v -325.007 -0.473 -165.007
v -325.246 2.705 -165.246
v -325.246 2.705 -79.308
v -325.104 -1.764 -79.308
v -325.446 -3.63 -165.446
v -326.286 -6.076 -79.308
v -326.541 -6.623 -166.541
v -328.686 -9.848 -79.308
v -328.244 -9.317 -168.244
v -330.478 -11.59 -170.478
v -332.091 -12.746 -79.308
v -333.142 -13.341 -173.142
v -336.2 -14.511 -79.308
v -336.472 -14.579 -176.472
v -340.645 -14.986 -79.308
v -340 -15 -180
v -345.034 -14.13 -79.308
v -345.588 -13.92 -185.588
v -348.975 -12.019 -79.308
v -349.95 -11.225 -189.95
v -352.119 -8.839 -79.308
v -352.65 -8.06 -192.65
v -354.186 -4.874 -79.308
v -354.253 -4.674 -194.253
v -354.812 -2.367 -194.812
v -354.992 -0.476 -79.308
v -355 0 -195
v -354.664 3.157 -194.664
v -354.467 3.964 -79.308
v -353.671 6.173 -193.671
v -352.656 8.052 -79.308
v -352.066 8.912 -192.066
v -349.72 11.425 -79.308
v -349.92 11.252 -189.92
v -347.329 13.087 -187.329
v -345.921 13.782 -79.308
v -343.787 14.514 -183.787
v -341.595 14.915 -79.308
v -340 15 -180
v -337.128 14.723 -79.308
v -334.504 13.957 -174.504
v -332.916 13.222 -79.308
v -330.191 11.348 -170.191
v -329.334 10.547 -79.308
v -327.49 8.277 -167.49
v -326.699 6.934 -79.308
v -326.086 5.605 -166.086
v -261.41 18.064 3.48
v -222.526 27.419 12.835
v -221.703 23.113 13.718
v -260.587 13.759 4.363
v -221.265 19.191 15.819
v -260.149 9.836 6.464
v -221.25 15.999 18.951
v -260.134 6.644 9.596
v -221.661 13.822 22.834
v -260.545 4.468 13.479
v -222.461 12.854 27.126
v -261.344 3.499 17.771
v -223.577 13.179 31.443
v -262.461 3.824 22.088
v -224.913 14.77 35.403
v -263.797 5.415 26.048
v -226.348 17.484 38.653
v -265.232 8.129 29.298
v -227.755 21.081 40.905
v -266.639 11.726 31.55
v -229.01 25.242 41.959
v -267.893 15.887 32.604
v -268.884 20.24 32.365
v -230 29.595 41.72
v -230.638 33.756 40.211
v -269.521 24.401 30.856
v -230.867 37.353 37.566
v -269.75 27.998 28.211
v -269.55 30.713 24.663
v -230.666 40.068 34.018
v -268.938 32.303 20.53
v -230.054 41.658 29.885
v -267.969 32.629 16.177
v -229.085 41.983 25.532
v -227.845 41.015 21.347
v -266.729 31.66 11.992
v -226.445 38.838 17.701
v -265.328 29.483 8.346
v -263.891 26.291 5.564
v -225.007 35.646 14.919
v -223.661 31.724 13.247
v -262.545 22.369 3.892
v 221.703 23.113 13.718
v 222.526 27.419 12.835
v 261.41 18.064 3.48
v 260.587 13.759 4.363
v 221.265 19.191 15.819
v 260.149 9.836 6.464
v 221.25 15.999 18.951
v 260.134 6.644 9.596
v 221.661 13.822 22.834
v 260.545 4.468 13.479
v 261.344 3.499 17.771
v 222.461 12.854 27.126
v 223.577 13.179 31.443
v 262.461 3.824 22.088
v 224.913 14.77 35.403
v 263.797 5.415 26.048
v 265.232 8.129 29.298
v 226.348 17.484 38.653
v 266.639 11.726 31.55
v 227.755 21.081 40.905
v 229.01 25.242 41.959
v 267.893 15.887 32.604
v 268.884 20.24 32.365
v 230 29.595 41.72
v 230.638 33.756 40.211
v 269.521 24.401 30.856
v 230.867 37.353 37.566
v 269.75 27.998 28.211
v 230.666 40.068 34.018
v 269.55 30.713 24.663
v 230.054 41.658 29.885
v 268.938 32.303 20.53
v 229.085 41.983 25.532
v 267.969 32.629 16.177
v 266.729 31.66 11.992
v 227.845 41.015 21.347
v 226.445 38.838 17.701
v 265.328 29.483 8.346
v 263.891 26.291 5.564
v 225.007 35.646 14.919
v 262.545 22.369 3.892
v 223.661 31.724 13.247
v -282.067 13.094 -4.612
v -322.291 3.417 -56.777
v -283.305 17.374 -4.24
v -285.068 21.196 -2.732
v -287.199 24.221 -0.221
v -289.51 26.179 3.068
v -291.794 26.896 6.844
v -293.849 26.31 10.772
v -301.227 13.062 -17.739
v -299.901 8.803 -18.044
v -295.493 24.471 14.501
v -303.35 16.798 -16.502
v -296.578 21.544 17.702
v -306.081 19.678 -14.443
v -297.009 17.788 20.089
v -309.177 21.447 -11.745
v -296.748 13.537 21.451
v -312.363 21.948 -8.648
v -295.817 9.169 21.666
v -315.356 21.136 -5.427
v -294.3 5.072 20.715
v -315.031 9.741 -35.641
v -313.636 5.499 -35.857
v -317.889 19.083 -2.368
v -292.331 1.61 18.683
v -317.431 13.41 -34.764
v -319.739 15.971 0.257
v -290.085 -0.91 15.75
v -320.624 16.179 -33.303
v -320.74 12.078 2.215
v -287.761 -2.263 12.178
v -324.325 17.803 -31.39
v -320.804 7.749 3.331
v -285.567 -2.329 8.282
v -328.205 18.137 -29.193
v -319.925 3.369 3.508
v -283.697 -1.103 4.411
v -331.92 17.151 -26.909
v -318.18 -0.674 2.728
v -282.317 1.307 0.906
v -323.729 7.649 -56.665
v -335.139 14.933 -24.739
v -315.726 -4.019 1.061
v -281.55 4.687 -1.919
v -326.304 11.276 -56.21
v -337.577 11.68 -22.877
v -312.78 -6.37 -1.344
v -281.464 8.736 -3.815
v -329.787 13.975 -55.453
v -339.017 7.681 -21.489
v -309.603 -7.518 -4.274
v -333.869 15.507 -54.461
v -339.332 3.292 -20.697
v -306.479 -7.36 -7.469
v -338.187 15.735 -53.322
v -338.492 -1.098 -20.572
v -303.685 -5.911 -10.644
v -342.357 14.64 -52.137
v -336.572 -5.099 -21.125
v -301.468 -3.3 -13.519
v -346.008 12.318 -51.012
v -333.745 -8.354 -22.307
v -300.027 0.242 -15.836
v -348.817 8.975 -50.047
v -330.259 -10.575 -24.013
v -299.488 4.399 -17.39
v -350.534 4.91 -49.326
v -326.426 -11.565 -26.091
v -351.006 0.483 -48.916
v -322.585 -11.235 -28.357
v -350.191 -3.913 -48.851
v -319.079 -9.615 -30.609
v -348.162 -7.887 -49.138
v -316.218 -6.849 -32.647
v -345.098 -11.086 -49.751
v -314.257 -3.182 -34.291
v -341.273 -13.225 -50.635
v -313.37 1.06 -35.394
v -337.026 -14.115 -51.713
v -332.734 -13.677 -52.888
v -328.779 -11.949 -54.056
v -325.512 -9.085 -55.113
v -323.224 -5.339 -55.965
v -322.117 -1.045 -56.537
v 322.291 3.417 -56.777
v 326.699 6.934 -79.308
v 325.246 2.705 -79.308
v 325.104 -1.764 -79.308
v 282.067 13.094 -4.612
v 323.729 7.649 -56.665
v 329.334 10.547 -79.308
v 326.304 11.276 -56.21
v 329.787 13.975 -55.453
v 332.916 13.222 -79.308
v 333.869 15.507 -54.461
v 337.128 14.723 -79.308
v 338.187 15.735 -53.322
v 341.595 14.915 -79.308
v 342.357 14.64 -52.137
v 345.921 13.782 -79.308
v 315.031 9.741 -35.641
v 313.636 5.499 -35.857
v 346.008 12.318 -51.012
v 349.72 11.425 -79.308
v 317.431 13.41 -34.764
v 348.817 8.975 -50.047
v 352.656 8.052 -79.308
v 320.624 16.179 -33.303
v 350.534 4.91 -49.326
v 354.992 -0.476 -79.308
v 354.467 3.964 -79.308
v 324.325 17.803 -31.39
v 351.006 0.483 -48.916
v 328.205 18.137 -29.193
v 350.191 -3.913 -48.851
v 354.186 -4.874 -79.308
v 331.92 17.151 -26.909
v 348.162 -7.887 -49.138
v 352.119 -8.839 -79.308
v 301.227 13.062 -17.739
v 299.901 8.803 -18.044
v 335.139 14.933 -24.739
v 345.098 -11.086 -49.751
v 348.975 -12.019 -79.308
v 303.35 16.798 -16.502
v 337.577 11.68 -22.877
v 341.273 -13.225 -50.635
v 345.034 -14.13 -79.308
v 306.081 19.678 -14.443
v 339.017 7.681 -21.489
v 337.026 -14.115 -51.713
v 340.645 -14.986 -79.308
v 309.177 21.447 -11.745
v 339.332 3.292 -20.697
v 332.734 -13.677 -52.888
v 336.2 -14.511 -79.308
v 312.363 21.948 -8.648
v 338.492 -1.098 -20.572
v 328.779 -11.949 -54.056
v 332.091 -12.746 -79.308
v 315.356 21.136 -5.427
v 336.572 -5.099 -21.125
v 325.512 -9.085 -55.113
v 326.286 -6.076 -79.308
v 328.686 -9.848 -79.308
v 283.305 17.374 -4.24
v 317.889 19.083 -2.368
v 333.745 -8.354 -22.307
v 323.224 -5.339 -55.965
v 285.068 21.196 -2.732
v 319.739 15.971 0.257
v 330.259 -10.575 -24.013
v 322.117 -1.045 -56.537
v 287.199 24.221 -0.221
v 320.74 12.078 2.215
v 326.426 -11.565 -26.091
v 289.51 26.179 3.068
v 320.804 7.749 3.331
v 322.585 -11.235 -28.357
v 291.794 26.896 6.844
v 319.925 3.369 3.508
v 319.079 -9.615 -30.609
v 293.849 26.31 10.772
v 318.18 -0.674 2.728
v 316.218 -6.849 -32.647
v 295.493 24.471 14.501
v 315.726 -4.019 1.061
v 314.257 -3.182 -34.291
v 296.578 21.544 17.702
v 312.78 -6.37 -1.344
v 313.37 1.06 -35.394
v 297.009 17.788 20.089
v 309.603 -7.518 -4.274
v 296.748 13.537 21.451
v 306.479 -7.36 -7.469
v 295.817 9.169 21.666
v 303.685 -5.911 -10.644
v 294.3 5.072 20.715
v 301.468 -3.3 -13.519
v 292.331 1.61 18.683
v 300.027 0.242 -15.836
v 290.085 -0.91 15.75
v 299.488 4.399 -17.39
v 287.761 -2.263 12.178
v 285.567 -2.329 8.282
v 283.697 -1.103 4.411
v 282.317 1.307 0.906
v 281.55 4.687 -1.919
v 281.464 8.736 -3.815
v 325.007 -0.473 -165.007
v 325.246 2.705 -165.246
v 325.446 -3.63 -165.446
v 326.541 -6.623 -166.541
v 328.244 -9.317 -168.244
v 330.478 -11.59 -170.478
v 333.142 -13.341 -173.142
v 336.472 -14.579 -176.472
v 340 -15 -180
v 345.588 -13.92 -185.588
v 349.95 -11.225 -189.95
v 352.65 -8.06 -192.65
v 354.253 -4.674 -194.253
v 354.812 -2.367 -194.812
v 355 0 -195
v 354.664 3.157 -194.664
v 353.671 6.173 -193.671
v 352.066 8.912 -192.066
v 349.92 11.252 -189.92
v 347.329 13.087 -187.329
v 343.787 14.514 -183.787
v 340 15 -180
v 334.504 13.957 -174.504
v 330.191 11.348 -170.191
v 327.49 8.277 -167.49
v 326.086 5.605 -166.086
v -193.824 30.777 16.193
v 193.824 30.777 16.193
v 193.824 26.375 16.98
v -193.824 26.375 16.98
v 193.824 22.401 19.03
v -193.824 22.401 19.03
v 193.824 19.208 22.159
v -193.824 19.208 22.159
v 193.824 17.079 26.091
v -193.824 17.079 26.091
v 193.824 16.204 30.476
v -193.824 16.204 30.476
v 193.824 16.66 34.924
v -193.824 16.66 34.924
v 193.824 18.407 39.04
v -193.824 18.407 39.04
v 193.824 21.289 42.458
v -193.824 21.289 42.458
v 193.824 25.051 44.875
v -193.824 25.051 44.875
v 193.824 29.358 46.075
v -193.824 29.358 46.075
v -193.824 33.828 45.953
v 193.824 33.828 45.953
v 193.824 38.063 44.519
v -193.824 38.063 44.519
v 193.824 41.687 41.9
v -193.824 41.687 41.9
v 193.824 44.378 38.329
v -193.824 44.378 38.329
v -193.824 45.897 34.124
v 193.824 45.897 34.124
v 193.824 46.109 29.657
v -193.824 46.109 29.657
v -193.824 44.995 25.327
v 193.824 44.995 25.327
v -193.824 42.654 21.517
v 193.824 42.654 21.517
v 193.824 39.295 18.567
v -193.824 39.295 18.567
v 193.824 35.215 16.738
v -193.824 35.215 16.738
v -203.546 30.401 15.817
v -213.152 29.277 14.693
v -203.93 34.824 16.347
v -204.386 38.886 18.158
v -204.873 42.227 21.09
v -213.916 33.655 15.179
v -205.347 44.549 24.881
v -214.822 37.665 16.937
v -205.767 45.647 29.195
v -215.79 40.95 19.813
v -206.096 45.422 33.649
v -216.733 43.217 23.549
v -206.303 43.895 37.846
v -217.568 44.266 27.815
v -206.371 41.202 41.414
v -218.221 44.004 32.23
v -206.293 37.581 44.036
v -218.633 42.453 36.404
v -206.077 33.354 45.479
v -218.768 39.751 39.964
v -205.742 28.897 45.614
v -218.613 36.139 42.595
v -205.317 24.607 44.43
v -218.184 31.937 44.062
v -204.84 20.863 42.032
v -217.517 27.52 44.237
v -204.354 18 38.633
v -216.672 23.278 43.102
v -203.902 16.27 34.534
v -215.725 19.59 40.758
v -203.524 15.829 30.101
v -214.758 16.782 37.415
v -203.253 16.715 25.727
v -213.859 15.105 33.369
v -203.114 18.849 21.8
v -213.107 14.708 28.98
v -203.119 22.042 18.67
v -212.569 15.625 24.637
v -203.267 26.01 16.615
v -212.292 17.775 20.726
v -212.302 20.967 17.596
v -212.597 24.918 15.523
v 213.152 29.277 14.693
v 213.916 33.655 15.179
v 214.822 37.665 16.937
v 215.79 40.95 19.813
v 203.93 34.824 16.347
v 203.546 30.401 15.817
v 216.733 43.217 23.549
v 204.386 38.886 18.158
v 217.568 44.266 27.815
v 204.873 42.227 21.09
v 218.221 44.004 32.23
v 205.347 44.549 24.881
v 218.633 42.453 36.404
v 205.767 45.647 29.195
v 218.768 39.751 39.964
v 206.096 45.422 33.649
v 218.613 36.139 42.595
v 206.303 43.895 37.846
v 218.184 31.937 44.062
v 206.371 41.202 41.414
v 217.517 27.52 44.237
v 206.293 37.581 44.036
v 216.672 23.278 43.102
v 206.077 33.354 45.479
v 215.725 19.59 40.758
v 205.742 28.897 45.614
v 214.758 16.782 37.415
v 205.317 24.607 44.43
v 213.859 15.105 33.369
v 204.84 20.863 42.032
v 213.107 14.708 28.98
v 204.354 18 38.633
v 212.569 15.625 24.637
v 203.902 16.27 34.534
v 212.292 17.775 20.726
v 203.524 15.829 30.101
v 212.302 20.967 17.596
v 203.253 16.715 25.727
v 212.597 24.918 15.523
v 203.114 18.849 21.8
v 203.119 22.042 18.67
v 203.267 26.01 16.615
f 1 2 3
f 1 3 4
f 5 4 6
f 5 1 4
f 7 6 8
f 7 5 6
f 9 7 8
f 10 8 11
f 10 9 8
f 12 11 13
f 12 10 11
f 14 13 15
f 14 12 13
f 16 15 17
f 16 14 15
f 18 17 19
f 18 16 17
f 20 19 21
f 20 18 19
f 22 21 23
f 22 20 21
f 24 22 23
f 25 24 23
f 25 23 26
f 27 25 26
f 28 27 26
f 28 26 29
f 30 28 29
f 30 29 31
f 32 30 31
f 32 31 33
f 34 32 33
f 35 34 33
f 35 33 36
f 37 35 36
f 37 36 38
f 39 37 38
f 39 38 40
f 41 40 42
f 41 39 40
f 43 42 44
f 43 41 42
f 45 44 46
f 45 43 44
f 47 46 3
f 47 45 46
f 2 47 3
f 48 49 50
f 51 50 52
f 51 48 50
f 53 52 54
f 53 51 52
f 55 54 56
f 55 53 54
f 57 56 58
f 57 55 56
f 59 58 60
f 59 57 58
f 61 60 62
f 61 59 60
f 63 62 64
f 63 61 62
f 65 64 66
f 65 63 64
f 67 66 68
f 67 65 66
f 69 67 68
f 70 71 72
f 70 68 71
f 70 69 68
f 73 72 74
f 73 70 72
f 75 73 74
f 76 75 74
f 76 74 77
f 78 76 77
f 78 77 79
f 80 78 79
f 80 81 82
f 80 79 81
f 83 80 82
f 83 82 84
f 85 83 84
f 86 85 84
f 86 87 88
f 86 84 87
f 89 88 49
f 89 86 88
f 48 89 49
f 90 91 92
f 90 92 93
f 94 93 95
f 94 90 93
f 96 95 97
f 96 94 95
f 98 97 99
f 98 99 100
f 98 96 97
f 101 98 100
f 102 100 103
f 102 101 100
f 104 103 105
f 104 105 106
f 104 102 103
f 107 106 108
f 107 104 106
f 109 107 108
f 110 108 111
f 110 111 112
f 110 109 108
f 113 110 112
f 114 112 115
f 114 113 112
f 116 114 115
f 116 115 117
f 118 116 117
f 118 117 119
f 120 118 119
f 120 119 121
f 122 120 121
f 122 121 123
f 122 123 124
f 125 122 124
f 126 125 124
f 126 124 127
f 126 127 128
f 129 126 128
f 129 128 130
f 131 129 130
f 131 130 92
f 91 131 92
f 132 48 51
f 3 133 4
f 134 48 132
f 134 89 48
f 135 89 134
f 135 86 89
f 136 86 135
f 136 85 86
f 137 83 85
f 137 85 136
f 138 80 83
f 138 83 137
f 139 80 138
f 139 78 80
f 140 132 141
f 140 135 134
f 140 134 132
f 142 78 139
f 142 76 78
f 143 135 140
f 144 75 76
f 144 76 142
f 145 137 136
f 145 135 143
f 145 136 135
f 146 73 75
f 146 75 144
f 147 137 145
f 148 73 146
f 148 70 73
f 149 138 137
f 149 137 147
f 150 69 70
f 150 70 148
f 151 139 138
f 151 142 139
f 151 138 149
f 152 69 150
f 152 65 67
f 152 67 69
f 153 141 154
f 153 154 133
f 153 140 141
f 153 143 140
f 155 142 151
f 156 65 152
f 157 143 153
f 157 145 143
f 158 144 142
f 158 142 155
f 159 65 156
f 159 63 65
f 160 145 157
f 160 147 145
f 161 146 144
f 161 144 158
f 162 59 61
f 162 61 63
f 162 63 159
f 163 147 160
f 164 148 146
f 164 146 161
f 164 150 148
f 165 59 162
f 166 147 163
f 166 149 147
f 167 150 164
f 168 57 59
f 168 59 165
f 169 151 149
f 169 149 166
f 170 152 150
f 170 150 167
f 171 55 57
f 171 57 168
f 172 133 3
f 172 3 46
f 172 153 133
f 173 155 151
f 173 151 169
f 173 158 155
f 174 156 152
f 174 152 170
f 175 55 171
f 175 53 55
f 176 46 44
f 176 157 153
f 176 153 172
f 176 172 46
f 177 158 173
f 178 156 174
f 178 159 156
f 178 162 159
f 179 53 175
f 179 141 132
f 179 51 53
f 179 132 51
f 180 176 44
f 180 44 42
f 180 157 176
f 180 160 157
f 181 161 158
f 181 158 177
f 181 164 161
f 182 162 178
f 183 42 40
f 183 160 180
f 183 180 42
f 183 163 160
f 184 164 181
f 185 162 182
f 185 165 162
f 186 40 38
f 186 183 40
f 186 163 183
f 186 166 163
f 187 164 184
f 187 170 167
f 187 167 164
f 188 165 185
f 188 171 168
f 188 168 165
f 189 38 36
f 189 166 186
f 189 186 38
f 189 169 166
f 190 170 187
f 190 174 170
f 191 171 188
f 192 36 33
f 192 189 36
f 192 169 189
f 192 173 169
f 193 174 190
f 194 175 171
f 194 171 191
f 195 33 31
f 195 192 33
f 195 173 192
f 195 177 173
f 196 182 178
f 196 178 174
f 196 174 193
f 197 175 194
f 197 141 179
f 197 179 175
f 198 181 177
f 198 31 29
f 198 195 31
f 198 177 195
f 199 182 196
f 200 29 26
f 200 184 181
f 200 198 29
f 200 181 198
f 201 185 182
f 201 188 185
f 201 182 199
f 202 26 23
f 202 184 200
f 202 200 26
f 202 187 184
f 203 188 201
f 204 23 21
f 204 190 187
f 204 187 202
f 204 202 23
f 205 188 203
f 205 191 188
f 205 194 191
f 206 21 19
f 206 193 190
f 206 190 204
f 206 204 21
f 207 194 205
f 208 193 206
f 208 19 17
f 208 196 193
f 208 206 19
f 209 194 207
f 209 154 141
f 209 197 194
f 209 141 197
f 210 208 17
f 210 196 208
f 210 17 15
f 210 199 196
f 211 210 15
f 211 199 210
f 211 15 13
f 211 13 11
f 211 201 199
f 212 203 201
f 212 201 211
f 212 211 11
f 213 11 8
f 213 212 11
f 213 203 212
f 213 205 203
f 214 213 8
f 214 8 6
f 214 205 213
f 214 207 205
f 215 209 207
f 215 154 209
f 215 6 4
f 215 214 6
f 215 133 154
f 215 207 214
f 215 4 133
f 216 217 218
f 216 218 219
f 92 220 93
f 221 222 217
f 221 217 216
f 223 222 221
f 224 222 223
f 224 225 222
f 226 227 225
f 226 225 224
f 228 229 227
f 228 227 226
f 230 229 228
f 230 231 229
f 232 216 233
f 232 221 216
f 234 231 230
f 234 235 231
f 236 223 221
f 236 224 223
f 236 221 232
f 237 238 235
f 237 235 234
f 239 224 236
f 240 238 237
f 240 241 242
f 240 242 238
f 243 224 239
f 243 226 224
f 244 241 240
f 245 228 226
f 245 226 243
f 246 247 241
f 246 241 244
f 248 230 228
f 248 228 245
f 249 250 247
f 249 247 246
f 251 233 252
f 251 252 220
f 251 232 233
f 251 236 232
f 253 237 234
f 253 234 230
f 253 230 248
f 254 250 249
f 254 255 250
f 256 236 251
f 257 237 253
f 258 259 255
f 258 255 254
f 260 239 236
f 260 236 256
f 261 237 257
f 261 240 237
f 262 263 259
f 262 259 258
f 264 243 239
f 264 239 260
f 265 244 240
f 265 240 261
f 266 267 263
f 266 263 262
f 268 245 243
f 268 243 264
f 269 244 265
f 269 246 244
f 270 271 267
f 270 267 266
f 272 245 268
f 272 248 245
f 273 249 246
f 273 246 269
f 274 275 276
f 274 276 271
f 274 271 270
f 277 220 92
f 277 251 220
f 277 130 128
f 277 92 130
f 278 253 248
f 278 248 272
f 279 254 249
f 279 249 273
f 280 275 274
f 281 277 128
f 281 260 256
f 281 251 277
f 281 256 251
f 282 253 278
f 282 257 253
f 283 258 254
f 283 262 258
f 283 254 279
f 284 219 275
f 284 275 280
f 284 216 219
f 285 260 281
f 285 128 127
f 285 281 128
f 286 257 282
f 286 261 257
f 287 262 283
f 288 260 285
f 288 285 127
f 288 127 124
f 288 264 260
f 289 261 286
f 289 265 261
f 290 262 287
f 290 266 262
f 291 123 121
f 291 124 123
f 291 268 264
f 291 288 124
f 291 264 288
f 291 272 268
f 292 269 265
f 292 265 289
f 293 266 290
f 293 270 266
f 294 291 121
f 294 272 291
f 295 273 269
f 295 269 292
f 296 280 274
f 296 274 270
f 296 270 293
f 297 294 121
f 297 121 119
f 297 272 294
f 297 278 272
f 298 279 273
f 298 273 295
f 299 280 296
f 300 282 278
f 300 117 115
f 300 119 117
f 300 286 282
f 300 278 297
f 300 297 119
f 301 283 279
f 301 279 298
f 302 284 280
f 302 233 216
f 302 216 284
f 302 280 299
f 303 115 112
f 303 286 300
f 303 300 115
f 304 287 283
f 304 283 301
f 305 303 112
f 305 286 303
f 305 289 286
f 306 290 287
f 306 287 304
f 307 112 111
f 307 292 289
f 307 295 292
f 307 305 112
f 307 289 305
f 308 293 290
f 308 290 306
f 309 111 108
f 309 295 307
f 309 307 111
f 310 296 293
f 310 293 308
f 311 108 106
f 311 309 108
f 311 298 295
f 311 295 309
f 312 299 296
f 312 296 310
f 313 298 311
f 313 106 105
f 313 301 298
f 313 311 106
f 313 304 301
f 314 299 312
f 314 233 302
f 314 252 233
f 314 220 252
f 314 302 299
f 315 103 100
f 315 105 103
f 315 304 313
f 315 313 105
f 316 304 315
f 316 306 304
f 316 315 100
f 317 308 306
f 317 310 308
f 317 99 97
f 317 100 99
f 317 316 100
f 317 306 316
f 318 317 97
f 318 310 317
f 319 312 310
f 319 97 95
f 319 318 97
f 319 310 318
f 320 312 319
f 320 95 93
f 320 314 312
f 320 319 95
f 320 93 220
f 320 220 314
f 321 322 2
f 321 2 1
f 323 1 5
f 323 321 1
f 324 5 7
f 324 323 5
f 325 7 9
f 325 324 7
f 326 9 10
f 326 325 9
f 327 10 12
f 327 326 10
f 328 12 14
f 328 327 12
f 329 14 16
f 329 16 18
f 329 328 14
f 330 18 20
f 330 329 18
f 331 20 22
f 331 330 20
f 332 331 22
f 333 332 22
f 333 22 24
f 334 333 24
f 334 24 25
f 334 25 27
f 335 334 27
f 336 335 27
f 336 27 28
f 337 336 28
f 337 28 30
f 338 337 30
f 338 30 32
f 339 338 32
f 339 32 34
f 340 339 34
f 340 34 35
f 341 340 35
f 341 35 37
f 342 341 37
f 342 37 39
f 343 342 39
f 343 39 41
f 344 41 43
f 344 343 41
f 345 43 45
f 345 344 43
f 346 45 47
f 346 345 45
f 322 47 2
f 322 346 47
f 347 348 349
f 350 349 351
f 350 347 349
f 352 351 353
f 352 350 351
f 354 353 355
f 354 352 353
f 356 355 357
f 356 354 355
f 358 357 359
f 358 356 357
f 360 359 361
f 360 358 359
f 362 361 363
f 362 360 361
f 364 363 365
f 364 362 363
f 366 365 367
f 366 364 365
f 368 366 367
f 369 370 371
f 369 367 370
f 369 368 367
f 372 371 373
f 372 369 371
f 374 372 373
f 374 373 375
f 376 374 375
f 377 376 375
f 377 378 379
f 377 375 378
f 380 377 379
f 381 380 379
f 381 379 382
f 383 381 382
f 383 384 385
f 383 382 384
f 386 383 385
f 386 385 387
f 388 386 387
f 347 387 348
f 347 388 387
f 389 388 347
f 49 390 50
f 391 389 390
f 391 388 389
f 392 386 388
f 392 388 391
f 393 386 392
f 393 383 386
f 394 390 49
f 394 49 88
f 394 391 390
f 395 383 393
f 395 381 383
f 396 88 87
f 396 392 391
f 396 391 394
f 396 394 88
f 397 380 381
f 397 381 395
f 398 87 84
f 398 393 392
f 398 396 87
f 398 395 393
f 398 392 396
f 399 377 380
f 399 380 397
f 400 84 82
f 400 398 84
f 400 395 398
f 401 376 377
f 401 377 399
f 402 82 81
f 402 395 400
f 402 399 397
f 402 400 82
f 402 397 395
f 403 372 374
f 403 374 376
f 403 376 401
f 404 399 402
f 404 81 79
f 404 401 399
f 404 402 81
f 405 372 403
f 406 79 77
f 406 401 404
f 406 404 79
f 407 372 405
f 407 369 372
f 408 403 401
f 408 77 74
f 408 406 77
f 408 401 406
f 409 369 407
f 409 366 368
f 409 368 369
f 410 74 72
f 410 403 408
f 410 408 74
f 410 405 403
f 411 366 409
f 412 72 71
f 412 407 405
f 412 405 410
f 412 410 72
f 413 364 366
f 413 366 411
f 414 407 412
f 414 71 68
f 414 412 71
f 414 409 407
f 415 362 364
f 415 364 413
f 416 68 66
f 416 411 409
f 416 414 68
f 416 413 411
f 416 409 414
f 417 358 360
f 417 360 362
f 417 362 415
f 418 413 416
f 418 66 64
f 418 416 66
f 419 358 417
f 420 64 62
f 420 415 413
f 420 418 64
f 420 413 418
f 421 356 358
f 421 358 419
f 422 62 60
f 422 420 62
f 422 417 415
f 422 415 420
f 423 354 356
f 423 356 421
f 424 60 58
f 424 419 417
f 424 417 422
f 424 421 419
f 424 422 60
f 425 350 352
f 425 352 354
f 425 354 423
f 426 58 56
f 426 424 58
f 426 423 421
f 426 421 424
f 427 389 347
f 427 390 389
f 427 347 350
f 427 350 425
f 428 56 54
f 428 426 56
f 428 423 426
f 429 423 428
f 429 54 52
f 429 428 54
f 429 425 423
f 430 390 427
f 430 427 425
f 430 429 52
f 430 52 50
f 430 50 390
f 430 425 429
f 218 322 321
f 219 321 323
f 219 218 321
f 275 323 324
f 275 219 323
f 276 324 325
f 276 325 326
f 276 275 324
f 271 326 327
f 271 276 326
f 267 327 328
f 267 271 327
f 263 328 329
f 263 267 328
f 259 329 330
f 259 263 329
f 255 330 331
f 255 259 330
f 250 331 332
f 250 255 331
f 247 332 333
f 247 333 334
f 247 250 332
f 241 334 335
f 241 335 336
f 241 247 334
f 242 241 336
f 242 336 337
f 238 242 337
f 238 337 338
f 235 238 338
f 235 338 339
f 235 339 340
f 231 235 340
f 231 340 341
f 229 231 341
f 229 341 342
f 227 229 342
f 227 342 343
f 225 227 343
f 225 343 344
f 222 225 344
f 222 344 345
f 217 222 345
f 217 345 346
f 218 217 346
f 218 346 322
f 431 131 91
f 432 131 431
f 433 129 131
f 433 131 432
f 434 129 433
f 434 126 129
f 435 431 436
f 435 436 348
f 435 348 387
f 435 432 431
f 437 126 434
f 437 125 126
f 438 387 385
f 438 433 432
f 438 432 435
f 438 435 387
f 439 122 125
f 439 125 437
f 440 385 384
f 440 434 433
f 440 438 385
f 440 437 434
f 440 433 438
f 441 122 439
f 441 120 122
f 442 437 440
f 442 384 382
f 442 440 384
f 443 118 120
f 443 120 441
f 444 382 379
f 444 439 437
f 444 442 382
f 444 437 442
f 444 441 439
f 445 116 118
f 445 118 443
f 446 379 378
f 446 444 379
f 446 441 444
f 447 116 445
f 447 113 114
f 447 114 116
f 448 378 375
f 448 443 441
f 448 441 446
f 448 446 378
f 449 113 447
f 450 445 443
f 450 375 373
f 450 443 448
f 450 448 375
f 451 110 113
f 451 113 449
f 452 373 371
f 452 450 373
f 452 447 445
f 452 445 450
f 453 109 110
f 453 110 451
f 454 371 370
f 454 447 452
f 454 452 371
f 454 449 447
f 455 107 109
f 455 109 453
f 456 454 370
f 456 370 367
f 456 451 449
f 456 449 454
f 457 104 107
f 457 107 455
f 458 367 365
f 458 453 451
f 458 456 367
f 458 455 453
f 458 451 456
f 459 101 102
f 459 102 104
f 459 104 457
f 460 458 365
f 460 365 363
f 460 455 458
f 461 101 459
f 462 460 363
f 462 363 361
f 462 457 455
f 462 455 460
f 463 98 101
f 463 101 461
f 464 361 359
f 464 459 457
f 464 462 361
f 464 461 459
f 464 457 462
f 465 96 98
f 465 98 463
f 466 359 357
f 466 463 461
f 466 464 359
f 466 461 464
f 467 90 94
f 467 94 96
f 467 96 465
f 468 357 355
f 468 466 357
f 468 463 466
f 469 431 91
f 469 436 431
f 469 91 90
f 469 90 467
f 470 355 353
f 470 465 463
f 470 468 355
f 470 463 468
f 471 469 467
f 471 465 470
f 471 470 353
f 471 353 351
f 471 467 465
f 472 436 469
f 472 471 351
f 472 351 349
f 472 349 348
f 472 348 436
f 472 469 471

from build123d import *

# Parameters (mm, degrees)
BARRER1_PROFILE_R = 15


with BuildPart() as part:
    # Barrer1: sweep along a curve in space
    with BuildLine() as barrer1_path:
        Line((264.918926477, 18.063618937, 18.063618937), (226.035142661, 27.418597771, 27.418597771))
        ThreePointArc((226.035142661, 27.418597771, 27.418597771), (210.148674123, 30.238757749, 30.238757749), (193.824243162, 31.187293721, 31.187293721))
        Line((193.824243162, 31.187293721, 31.187293721), (-193.824243162, 31.187293721, 31.187293721))
        ThreePointArc((-193.824243162, 31.187293721, 31.187293721), (-210.148674123, 30.238757749, 30.238757749), (-226.035142661, 27.418597771, 27.418597771))
        Line((-264.918926477, 18.063618937, 18.063618937), (-226.035142661, 27.418597771, 27.418597771))
        ThreePointArc((-264.918926477, 18.063618937, 18.063618937), (-318.95127781, 5.064073793, -17.169648176), (-340, 0, -79.30798358))
        Line((-340, 0, -79.30798358), (-340, 0, -180))
        Line((-340, 0, -180), (340, 0, -180))
        Line((340, 0, -79.30798358), (340, 0, -180))
        ThreePointArc((264.918926477, 18.063618937, 18.063618937), (318.95127781, 5.064073793, -17.169648176), (340, 0, -79.30798358))
    # Barrer1 profile (on start of the path) → Barrer1 (sweep)
    with BuildSketch(Plane(origin=(264.918926477, 18.063618937, 18.063618937), x_dir=(-0.23391363473017787, 0, -0.9722573792403516), z_dir=(-0.9467025907554608, 0.22776545464237832, 0.22776545464237832))):
        Circle(BARRER1_PROFILE_R)
    sweep(path=barrer1_path.line, transition=Transition.RIGHT)


solid = part.part
